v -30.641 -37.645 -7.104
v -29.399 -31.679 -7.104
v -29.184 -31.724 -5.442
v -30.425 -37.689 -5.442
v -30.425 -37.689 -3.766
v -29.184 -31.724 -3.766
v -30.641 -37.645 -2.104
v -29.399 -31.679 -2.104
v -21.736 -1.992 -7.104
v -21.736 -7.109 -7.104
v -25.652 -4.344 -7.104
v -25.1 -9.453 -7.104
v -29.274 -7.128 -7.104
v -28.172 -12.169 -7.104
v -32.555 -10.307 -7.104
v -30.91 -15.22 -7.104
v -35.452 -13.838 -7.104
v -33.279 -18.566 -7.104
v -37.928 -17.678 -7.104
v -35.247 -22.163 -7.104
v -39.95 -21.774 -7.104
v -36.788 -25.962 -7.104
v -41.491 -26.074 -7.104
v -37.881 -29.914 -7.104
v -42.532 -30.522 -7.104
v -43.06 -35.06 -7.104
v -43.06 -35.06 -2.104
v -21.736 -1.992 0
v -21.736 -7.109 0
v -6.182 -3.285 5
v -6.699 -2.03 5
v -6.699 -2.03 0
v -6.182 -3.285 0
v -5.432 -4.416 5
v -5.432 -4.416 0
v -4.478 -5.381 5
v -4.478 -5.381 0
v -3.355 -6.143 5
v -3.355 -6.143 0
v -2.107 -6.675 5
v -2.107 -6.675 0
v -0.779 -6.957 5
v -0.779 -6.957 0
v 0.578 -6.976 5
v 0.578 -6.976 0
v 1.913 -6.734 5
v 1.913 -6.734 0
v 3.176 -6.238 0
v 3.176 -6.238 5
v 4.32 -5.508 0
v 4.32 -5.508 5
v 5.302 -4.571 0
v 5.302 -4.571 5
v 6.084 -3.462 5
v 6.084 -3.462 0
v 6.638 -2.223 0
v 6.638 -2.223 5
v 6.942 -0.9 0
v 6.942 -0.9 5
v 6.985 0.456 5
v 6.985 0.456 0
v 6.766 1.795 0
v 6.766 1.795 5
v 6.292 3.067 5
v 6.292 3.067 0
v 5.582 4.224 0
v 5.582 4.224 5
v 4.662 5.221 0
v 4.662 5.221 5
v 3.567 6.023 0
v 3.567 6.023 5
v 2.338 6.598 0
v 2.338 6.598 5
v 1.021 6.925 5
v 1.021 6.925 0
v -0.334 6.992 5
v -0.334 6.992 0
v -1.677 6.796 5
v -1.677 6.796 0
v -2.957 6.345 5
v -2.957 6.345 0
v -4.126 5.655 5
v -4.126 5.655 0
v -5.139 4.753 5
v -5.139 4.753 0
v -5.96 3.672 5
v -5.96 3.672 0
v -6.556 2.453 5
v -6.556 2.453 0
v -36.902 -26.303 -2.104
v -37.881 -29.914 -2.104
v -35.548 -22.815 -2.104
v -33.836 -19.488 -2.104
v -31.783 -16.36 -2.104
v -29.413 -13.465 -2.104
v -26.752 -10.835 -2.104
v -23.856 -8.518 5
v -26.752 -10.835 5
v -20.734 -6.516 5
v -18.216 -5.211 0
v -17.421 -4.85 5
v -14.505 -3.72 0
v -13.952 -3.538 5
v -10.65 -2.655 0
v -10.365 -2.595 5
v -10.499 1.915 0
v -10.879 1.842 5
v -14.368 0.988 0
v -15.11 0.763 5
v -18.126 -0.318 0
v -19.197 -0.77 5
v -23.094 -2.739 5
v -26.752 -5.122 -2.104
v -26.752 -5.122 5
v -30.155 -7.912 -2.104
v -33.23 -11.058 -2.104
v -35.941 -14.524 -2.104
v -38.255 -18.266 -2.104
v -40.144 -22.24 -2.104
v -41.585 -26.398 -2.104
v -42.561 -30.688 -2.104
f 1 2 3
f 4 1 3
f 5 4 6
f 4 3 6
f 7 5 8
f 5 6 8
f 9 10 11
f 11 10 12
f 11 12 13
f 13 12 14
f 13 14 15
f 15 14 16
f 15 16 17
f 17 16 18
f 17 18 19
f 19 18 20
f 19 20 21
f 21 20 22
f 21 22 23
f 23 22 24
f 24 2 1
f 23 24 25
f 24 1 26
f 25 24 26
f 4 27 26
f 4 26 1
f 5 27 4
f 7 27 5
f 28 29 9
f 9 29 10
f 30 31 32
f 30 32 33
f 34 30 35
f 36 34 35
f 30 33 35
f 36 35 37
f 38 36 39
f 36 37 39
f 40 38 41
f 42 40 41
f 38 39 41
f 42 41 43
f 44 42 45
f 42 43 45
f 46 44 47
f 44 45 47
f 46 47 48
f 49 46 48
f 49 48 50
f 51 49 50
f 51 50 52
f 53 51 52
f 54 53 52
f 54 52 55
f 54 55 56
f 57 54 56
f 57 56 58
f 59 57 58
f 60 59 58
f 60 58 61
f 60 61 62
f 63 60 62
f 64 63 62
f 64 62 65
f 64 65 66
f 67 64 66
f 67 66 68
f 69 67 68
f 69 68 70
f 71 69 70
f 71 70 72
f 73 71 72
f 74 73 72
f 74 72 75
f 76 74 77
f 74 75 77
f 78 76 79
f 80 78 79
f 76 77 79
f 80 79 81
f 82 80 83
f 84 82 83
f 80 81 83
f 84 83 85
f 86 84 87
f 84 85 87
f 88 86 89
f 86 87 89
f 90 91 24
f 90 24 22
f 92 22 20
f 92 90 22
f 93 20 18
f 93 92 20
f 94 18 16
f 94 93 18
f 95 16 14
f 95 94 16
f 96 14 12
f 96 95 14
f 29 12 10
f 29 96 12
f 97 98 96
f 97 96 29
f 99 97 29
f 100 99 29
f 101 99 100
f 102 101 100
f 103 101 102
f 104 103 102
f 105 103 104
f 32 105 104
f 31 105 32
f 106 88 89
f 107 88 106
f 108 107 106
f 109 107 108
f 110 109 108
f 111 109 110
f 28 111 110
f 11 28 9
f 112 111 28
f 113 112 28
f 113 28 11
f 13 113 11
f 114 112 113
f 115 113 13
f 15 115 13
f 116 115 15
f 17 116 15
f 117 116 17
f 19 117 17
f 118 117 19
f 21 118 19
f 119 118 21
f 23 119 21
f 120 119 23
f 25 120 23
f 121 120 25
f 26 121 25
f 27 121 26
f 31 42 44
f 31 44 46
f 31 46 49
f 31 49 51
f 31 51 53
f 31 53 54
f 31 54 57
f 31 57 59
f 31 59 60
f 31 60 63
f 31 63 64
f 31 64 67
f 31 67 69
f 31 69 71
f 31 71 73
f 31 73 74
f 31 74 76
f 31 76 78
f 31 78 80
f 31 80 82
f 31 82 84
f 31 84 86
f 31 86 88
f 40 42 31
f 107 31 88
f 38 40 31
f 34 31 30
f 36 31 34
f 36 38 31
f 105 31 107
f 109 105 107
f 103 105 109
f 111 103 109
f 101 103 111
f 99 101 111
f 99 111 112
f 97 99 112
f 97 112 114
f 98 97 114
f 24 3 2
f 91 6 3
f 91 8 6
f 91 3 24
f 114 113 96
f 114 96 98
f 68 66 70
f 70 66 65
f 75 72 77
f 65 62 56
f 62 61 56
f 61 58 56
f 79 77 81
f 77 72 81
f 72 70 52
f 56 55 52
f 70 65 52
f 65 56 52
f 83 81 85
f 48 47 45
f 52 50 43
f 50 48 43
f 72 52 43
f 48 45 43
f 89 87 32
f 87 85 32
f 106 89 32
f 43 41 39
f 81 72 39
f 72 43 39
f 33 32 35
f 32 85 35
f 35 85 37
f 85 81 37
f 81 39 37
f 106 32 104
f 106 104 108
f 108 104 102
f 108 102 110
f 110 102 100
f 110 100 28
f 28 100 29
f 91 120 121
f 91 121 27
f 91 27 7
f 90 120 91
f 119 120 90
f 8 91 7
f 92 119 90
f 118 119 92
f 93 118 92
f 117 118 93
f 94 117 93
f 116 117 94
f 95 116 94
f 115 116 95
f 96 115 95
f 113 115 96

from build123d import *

# Parameters (mm, degrees)
BOSS_EXTRU_2_DEPTH      = 5
BOSS_EXTRU_3_DEPTH      = 45
ENL_V_START             = -73.880031702
ENL_V_MAT_EXTRU_3_DEPTH = 78.880031702
ESQUISSE4_4_W           = 16.307493561
ESQUISSE4_4_H           = 7.104058167
ENL_V_MAT_EXTRU_4_DEPTH = 59.591870128
ENL_V_MAT_EXTRU_6_DEPTH = 58.24377063
ENL_V_MAT_EXTRU_7_DEPTH = 59.494096558


with BuildPart() as part:
    # Esquisse3 → Boss.-Extru.2 (new body)
    with BuildSketch(Plane.XY):
        with BuildLine():
            ThreePointArc((7, 0), (1.246257582, 6.888166813), (-6.556240583, 2.452694319))
            ThreePointArc((-6.556240583, 2.452694319), (-6.99644453, 0.22307834), (-6.699170831, -2.030051767))
            ThreePointArc((-6.699170831, -2.030051767), (1.026110175, -6.924384298), (7, 0))
        make_face()
    extrude(amount=BOSS_EXTRU_2_DEPTH)

    # Esquisse3<3> → Boss.-Extru.3 (add)
    with BuildSketch(Plane.XY):
        with BuildLine():
            ThreePointArc((-6.556240583, 2.452694319), (-31.795381091, -9.503990443), (-43.059714875, -35.059641647))
            Line((-43.059714875, -35.059641647), (-29.67043681, -37.846531887))
            Line((-29.67043681, -37.846531887), (-28.42882324, -31.881349224))
            Line((-28.42882324, -31.881349224), (-37.880972605, -29.913946449))
            ThreePointArc((-37.880972605, -29.913946449), (-26.825365644, -10.900303142), (-6.699170831, -2.030051767))
            ThreePointArc((-6.699170831, -2.030051767), (-6.99644453, 0.22307834), (-6.556240583, 2.452694319))
        make_face()
    boss_extru_3 = extrude(amount=BOSS_EXTRU_3_DEPTH)

    # Esquisse4 → Enlèv. mat.-Extru.3 (cut)
    with BuildSketch(Plane(origin=(0, 0, 0), x_dir=(1, 0, 0), z_dir=(0, 1, 0)).offset(ENL_V_START)):
        Polygon((-6.556240583, -21.643777245), (-6.556240583, -5), (-21.736227675, -5), (-21.736227675, -12.104058167), (-43.059714875, -12.104058167), (-43.059714875, -45), (-43.059714875, -53.527020644), (-6.425184121, -53.527020644), align=None)
    enl_v_mat_extru_3 = extrude(amount=ENL_V_MAT_EXTRU_3_DEPTH, mode=Mode.SUBTRACT)

    # Esquisse4<4> → Enlèv. mat.-Extru.4 (cut, through all)
    with BuildSketch(Plane(origin=(0, 0, 0), x_dir=(1, 0, 0), z_dir=(0, 1, 0))):
        with Locations((-34.905968095, -3.552029084)):
            Rectangle(ESQUISSE4_4_W, ESQUISSE4_4_H)
    enl_v_mat_extru_4 = extrude(amount=-ENL_V_MAT_EXTRU_4_DEPTH, mode=Mode.SUBTRACT)

    # Esquisse5 → Enlèv. mat.-Extru.6 (cut, through all)
    with BuildSketch(Plane(origin=(-7.540837864, -36.229046112, 0), x_dir=(0.9790175257089632, -0.2037760642340011, 0), z_dir=(0.2037760642340011, 0.9790175257089632, 0))):
        with BuildLine():
            Line((-22.326681436, -7.104058167), (-21.33566032, -7.104058167))
            Line((-21.33566032, -7.104058167), (-21.33566032, -12.104058167))
            Line((-21.33566032, -12.104058167), (-22.326681436, -12.104058167))
            ThreePointArc((-22.326681436, -12.104058167), (-22.079342596, -9.604058167), (-22.326681436, -7.104058167))
        make_face()
    enl_v_mat_extru_6 = extrude(amount=-ENL_V_MAT_EXTRU_6_DEPTH, mode=Mode.SUBTRACT)

    # Symétrie1: Boss.-Extru.3, Enlèv. mat.-Extru.3, Enlèv. mat.-Extru.4, Enlèv. mat.-Extru.6 across plane
    add(boss_extru_3.mirror(Plane.XY.offset(2.5)))
    add(enl_v_mat_extru_3.mirror(Plane.XY.offset(2.5)), mode=Mode.SUBTRACT)
    add(enl_v_mat_extru_4.mirror(Plane.XY.offset(2.5)), mode=Mode.SUBTRACT)
    add(enl_v_mat_extru_6.mirror(Plane.XY.offset(2.5)), mode=Mode.SUBTRACT)

    # Esquisse6 → Enlèv. mat.-Extru.7 (cut, through all)
    with BuildSketch(Plane(origin=(0, 0, 0), x_dir=(1, 0, 0), z_dir=(0, 1, 0))):
        Polygon((-21.736227675, -5), (-29.704410318, -5), (-43.059714875, -7.104058167), (-43.059714875, -12.104058167), (-21.736227675, -12.104058167), align=None)
    extrude(amount=-ENL_V_MAT_EXTRU_7_DEPTH, mode=Mode.SUBTRACT)


solid = part.part
